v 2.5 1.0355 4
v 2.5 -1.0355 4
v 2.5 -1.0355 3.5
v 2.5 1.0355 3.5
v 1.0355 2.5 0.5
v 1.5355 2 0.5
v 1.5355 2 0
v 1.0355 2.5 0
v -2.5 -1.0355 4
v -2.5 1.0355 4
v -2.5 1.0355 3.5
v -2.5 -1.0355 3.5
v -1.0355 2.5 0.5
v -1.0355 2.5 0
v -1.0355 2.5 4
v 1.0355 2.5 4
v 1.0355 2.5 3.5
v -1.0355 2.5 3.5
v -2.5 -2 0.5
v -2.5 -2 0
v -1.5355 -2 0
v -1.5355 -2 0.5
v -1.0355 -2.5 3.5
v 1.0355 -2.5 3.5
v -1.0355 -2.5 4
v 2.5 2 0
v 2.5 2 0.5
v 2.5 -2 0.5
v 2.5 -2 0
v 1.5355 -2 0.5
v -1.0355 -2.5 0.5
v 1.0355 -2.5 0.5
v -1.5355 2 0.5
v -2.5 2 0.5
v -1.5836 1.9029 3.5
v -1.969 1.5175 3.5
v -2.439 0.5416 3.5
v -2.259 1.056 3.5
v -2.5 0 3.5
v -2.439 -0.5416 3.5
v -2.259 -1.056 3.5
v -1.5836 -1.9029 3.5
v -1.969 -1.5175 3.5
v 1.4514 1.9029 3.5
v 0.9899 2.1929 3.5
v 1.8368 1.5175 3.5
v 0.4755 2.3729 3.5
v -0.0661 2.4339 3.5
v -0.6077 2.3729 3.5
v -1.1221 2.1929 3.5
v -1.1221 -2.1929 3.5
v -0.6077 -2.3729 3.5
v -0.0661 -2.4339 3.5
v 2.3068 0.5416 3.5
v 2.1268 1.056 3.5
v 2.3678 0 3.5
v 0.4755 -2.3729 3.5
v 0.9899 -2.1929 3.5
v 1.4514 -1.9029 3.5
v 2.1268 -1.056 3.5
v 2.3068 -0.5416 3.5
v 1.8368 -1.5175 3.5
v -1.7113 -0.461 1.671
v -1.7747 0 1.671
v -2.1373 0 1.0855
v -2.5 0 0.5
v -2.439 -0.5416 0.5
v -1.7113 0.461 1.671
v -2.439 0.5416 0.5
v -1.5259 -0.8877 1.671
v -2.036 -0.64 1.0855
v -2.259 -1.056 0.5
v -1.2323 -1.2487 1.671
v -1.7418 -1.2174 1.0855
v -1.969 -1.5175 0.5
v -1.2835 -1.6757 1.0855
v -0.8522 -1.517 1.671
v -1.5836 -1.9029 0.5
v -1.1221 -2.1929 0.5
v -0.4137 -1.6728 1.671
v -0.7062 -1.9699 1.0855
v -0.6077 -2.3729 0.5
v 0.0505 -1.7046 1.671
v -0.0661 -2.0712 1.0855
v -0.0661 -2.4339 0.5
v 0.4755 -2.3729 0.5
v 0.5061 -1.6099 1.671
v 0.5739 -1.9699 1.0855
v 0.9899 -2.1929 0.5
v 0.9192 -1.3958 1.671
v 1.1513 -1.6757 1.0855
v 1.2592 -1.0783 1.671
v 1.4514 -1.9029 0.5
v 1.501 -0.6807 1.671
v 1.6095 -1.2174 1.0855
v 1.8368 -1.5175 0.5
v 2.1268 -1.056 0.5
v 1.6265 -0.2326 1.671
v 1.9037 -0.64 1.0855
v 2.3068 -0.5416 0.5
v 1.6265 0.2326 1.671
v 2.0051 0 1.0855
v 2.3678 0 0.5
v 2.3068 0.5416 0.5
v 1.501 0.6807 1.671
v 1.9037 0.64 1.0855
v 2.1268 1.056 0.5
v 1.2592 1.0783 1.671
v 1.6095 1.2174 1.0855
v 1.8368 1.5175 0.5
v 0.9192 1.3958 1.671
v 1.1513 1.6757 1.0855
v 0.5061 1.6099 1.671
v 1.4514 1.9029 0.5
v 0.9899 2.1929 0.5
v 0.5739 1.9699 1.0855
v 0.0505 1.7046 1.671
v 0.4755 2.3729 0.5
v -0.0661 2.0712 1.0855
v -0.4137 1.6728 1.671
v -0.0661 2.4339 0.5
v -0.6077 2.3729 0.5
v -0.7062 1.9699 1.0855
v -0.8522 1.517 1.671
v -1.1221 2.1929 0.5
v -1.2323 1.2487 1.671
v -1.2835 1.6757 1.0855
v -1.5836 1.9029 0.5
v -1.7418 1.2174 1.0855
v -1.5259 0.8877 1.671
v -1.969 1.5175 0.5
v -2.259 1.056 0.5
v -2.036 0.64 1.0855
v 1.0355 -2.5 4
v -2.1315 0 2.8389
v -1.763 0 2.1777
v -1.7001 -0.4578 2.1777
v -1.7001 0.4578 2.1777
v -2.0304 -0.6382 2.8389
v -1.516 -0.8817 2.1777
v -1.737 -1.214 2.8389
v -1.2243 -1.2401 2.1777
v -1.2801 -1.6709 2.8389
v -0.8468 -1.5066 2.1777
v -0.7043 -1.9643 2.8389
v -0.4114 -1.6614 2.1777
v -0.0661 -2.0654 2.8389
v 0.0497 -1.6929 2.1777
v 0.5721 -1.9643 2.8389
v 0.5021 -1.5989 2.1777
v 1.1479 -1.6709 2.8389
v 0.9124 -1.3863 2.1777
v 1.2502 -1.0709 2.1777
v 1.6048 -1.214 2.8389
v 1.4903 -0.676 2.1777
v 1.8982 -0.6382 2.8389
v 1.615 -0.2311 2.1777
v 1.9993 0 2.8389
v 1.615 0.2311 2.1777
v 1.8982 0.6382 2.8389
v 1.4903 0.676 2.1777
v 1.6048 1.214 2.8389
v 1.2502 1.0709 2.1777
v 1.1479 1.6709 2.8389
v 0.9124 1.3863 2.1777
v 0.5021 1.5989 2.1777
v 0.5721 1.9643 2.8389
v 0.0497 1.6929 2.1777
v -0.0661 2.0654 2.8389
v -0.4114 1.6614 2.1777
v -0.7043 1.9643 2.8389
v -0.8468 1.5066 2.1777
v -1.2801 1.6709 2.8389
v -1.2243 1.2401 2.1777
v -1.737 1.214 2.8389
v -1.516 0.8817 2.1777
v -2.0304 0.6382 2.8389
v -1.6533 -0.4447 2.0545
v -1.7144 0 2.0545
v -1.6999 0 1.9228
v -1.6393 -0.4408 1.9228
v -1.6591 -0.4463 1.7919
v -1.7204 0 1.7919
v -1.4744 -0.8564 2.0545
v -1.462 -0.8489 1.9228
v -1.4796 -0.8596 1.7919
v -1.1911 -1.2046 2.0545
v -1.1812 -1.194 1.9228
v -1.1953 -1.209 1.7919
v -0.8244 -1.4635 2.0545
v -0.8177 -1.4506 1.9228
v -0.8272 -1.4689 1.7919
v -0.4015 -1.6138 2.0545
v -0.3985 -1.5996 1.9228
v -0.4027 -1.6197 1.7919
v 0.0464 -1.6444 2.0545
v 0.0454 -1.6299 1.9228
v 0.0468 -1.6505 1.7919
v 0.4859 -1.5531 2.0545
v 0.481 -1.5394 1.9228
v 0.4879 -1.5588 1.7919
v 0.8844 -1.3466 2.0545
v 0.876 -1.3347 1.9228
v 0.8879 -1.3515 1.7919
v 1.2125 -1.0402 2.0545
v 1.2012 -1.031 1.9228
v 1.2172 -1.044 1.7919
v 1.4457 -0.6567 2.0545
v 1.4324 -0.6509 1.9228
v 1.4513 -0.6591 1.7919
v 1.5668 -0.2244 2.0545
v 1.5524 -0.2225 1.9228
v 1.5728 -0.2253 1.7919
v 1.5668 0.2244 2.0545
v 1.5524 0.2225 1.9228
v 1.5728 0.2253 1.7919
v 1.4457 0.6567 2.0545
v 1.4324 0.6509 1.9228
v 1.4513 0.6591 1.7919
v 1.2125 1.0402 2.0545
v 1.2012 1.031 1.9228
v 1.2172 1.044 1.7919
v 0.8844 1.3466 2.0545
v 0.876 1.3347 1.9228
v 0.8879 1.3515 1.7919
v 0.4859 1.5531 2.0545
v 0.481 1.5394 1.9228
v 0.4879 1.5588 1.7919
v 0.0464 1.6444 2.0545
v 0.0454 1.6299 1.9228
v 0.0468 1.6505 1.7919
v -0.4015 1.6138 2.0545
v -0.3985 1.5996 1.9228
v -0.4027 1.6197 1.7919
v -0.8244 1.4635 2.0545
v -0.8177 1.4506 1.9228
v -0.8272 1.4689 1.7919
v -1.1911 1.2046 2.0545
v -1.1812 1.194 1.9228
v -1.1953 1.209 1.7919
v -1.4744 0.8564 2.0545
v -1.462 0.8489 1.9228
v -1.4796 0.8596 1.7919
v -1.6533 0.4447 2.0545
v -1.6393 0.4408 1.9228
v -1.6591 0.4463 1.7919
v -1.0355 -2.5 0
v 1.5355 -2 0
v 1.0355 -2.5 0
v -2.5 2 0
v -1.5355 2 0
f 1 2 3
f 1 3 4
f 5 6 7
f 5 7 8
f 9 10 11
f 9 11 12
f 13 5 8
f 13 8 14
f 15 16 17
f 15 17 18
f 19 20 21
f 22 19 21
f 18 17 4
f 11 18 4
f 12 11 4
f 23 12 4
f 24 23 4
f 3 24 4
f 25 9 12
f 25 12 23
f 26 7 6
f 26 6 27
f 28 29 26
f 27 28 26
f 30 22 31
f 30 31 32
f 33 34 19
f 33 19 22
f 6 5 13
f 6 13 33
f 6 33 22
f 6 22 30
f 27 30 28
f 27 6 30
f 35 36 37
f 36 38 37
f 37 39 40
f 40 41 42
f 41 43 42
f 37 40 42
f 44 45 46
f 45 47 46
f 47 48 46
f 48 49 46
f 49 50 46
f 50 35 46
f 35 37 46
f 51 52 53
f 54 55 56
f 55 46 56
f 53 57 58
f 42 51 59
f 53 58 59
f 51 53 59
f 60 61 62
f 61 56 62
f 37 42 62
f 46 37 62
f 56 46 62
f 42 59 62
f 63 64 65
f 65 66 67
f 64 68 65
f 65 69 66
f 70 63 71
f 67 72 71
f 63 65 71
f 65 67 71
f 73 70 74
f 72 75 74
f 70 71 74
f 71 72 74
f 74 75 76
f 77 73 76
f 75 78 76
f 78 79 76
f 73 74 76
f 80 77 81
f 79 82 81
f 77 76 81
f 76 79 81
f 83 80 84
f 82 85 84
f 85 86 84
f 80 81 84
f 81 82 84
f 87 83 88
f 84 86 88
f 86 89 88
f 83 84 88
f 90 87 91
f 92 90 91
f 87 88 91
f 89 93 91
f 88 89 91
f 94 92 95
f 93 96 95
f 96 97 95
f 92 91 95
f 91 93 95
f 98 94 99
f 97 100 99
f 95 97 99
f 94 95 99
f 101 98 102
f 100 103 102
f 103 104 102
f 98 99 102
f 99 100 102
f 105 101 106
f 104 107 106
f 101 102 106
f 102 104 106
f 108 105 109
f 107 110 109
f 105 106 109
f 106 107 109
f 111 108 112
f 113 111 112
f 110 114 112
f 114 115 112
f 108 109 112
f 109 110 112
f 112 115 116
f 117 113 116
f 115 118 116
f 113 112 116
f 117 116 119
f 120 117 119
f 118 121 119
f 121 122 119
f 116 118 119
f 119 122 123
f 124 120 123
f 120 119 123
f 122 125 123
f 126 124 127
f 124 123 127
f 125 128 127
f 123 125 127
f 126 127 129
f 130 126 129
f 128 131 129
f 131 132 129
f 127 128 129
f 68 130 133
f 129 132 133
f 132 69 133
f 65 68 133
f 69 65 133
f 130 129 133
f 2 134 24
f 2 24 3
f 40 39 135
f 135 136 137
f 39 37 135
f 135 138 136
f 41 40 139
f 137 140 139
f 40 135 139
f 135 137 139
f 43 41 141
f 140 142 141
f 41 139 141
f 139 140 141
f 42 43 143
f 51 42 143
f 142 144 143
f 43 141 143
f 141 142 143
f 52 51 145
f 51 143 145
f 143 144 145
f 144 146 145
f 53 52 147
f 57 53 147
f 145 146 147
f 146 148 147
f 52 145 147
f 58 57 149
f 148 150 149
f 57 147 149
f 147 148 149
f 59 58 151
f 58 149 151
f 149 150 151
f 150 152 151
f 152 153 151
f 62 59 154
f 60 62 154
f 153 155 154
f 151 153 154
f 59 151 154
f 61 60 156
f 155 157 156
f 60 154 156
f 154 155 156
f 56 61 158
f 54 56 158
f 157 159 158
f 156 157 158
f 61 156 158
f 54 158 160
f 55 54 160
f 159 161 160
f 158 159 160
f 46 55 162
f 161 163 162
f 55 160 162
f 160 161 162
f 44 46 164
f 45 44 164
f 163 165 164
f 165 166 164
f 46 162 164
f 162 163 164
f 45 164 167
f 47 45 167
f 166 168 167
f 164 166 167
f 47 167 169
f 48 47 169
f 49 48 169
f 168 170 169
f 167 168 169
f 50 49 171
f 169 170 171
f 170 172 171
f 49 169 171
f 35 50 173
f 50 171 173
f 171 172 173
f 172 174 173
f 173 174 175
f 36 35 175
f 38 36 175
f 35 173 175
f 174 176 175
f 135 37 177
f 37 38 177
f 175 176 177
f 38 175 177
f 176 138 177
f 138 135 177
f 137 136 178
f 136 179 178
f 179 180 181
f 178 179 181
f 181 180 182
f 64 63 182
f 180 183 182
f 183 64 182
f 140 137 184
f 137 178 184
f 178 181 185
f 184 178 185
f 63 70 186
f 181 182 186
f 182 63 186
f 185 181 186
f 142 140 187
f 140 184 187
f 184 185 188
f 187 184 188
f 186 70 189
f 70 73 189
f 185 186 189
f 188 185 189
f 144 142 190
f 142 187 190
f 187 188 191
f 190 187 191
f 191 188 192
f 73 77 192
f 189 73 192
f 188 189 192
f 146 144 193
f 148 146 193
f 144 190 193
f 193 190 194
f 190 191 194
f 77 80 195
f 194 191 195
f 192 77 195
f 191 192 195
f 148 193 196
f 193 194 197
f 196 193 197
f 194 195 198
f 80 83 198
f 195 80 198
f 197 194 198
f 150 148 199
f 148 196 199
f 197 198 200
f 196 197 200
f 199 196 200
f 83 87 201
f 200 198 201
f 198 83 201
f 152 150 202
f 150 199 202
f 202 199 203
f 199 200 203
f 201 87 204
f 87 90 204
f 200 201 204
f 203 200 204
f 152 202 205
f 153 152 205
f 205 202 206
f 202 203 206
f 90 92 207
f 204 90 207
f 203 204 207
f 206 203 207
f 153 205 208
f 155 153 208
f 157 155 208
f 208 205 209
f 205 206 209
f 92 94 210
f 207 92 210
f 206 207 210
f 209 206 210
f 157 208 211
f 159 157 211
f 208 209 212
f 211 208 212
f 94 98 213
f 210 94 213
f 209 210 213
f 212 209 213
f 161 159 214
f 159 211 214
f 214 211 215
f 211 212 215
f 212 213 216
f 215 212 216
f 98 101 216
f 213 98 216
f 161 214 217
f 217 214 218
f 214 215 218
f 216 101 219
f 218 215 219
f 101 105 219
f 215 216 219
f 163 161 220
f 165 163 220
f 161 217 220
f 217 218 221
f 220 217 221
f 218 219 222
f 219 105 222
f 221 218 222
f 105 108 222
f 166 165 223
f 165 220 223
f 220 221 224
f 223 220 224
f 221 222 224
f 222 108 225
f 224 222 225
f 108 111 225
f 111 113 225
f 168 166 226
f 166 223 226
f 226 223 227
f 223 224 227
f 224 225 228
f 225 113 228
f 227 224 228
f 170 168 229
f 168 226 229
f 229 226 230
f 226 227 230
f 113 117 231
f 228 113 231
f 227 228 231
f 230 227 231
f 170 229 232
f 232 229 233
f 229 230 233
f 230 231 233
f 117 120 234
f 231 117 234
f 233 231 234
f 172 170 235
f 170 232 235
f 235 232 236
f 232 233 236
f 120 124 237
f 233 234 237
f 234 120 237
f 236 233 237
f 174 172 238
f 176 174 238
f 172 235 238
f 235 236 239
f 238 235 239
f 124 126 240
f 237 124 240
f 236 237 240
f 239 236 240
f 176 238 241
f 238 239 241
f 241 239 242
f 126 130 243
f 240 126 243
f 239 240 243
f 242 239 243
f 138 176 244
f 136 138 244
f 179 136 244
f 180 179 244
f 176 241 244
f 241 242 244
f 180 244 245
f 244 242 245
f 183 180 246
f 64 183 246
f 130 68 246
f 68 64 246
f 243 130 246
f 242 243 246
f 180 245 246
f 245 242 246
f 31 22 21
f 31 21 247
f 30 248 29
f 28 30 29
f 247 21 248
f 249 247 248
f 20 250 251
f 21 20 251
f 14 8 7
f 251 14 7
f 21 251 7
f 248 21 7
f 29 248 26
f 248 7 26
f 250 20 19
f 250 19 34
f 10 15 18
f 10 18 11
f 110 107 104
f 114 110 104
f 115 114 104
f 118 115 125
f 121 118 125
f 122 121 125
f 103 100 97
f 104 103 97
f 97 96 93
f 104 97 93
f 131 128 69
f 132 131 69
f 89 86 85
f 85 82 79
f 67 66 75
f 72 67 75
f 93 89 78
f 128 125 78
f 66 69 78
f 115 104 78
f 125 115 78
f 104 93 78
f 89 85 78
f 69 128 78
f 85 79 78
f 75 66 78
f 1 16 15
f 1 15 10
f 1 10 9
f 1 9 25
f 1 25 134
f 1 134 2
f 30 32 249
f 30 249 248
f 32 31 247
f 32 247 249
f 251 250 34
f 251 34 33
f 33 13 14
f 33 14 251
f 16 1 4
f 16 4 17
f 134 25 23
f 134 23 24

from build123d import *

# Parameters (mm, degrees)
F0_W     = 1.25
F0_H     = 4
F1_DEPTH = 0.5
F4_DEPTH = 0.5
F5_START = -3.5
F5_DEPTH = 0.5


with BuildPart() as f1:
    # F0 (on Top) → F1 (new body)
    with BuildSketch(Plane.XY):
        with Locations((-1.875, 0)):
            Rectangle(F0_W, F0_H)
    extrude(amount=F1_DEPTH)



with BuildPart() as f1b:
    # F0 (on Top) → F1, piece 2 (new body)
    with BuildSketch(Plane.XY):
        with Locations((1.875, 0)):
            Rectangle(F0_W, F0_H)
    extrude(amount=F1_DEPTH)


with BuildPart() as f4:
    # F3 (on offset) → F4 (new body)
    with BuildSketch(Plane.XY.offset(4)):
        Polygon((1.0355339059, 2.5), (-1.0355339059, 2.5), (-2.5, 1.0355339059), (-2.5, -1.0355339059), (-1.0355339059, -2.5), (1.0355339059, -2.5), (2.5, -1.0355339059), (2.5, 1.0355339059), align=None)
    extrude(amount=-F4_DEPTH)


with BuildPart() as f1_1:
    add(f1.part)

    add(f1b.part)  # F5 merges F1b
    # F3 (on offset) → F5 (join)
    with BuildSketch(Plane.XY.offset(4).offset(F5_START)):
        Polygon((1.0355339059, 2.5), (-1.0355339059, 2.5), (-2.5, 1.0355339059), (-2.5, -1.0355339059), (-1.0355339059, -2.5), (1.0355339059, -2.5), (2.5, -1.0355339059), (2.5, 1.0355339059), align=None)
    extrude(amount=-F5_DEPTH)


with BuildPart() as f7:
    # F6 (on Front) → F7 (revolve)
    with BuildSketch(Plane.XZ):
        with BuildLine():
            Line((-0.0661092199, 3.5), (-2.5, 3.5))
            Line((-2.5, 3.5), (-1.7629919787, 2.1777114235))
            ThreePointArc((-1.7629919787, 2.1777114235), (-1.6998659538, 1.9227631751), (-1.7746703106, 1.6709938113))
            Line((-1.7746703106, 1.6709938113), (-2.5, 0.5))
            Line((-2.5, 0.5), (-0.0661092199, 0.5))
            Line((-0.0661092199, 0.5), (-0.0661092199, 3.5))
        make_face()
    revolve(axis=Axis((-0.0661092199, 0, 2.4142542388), (0, 0, 1)))


solid = Compound([f4.part, f1_1.part, f7.part])
